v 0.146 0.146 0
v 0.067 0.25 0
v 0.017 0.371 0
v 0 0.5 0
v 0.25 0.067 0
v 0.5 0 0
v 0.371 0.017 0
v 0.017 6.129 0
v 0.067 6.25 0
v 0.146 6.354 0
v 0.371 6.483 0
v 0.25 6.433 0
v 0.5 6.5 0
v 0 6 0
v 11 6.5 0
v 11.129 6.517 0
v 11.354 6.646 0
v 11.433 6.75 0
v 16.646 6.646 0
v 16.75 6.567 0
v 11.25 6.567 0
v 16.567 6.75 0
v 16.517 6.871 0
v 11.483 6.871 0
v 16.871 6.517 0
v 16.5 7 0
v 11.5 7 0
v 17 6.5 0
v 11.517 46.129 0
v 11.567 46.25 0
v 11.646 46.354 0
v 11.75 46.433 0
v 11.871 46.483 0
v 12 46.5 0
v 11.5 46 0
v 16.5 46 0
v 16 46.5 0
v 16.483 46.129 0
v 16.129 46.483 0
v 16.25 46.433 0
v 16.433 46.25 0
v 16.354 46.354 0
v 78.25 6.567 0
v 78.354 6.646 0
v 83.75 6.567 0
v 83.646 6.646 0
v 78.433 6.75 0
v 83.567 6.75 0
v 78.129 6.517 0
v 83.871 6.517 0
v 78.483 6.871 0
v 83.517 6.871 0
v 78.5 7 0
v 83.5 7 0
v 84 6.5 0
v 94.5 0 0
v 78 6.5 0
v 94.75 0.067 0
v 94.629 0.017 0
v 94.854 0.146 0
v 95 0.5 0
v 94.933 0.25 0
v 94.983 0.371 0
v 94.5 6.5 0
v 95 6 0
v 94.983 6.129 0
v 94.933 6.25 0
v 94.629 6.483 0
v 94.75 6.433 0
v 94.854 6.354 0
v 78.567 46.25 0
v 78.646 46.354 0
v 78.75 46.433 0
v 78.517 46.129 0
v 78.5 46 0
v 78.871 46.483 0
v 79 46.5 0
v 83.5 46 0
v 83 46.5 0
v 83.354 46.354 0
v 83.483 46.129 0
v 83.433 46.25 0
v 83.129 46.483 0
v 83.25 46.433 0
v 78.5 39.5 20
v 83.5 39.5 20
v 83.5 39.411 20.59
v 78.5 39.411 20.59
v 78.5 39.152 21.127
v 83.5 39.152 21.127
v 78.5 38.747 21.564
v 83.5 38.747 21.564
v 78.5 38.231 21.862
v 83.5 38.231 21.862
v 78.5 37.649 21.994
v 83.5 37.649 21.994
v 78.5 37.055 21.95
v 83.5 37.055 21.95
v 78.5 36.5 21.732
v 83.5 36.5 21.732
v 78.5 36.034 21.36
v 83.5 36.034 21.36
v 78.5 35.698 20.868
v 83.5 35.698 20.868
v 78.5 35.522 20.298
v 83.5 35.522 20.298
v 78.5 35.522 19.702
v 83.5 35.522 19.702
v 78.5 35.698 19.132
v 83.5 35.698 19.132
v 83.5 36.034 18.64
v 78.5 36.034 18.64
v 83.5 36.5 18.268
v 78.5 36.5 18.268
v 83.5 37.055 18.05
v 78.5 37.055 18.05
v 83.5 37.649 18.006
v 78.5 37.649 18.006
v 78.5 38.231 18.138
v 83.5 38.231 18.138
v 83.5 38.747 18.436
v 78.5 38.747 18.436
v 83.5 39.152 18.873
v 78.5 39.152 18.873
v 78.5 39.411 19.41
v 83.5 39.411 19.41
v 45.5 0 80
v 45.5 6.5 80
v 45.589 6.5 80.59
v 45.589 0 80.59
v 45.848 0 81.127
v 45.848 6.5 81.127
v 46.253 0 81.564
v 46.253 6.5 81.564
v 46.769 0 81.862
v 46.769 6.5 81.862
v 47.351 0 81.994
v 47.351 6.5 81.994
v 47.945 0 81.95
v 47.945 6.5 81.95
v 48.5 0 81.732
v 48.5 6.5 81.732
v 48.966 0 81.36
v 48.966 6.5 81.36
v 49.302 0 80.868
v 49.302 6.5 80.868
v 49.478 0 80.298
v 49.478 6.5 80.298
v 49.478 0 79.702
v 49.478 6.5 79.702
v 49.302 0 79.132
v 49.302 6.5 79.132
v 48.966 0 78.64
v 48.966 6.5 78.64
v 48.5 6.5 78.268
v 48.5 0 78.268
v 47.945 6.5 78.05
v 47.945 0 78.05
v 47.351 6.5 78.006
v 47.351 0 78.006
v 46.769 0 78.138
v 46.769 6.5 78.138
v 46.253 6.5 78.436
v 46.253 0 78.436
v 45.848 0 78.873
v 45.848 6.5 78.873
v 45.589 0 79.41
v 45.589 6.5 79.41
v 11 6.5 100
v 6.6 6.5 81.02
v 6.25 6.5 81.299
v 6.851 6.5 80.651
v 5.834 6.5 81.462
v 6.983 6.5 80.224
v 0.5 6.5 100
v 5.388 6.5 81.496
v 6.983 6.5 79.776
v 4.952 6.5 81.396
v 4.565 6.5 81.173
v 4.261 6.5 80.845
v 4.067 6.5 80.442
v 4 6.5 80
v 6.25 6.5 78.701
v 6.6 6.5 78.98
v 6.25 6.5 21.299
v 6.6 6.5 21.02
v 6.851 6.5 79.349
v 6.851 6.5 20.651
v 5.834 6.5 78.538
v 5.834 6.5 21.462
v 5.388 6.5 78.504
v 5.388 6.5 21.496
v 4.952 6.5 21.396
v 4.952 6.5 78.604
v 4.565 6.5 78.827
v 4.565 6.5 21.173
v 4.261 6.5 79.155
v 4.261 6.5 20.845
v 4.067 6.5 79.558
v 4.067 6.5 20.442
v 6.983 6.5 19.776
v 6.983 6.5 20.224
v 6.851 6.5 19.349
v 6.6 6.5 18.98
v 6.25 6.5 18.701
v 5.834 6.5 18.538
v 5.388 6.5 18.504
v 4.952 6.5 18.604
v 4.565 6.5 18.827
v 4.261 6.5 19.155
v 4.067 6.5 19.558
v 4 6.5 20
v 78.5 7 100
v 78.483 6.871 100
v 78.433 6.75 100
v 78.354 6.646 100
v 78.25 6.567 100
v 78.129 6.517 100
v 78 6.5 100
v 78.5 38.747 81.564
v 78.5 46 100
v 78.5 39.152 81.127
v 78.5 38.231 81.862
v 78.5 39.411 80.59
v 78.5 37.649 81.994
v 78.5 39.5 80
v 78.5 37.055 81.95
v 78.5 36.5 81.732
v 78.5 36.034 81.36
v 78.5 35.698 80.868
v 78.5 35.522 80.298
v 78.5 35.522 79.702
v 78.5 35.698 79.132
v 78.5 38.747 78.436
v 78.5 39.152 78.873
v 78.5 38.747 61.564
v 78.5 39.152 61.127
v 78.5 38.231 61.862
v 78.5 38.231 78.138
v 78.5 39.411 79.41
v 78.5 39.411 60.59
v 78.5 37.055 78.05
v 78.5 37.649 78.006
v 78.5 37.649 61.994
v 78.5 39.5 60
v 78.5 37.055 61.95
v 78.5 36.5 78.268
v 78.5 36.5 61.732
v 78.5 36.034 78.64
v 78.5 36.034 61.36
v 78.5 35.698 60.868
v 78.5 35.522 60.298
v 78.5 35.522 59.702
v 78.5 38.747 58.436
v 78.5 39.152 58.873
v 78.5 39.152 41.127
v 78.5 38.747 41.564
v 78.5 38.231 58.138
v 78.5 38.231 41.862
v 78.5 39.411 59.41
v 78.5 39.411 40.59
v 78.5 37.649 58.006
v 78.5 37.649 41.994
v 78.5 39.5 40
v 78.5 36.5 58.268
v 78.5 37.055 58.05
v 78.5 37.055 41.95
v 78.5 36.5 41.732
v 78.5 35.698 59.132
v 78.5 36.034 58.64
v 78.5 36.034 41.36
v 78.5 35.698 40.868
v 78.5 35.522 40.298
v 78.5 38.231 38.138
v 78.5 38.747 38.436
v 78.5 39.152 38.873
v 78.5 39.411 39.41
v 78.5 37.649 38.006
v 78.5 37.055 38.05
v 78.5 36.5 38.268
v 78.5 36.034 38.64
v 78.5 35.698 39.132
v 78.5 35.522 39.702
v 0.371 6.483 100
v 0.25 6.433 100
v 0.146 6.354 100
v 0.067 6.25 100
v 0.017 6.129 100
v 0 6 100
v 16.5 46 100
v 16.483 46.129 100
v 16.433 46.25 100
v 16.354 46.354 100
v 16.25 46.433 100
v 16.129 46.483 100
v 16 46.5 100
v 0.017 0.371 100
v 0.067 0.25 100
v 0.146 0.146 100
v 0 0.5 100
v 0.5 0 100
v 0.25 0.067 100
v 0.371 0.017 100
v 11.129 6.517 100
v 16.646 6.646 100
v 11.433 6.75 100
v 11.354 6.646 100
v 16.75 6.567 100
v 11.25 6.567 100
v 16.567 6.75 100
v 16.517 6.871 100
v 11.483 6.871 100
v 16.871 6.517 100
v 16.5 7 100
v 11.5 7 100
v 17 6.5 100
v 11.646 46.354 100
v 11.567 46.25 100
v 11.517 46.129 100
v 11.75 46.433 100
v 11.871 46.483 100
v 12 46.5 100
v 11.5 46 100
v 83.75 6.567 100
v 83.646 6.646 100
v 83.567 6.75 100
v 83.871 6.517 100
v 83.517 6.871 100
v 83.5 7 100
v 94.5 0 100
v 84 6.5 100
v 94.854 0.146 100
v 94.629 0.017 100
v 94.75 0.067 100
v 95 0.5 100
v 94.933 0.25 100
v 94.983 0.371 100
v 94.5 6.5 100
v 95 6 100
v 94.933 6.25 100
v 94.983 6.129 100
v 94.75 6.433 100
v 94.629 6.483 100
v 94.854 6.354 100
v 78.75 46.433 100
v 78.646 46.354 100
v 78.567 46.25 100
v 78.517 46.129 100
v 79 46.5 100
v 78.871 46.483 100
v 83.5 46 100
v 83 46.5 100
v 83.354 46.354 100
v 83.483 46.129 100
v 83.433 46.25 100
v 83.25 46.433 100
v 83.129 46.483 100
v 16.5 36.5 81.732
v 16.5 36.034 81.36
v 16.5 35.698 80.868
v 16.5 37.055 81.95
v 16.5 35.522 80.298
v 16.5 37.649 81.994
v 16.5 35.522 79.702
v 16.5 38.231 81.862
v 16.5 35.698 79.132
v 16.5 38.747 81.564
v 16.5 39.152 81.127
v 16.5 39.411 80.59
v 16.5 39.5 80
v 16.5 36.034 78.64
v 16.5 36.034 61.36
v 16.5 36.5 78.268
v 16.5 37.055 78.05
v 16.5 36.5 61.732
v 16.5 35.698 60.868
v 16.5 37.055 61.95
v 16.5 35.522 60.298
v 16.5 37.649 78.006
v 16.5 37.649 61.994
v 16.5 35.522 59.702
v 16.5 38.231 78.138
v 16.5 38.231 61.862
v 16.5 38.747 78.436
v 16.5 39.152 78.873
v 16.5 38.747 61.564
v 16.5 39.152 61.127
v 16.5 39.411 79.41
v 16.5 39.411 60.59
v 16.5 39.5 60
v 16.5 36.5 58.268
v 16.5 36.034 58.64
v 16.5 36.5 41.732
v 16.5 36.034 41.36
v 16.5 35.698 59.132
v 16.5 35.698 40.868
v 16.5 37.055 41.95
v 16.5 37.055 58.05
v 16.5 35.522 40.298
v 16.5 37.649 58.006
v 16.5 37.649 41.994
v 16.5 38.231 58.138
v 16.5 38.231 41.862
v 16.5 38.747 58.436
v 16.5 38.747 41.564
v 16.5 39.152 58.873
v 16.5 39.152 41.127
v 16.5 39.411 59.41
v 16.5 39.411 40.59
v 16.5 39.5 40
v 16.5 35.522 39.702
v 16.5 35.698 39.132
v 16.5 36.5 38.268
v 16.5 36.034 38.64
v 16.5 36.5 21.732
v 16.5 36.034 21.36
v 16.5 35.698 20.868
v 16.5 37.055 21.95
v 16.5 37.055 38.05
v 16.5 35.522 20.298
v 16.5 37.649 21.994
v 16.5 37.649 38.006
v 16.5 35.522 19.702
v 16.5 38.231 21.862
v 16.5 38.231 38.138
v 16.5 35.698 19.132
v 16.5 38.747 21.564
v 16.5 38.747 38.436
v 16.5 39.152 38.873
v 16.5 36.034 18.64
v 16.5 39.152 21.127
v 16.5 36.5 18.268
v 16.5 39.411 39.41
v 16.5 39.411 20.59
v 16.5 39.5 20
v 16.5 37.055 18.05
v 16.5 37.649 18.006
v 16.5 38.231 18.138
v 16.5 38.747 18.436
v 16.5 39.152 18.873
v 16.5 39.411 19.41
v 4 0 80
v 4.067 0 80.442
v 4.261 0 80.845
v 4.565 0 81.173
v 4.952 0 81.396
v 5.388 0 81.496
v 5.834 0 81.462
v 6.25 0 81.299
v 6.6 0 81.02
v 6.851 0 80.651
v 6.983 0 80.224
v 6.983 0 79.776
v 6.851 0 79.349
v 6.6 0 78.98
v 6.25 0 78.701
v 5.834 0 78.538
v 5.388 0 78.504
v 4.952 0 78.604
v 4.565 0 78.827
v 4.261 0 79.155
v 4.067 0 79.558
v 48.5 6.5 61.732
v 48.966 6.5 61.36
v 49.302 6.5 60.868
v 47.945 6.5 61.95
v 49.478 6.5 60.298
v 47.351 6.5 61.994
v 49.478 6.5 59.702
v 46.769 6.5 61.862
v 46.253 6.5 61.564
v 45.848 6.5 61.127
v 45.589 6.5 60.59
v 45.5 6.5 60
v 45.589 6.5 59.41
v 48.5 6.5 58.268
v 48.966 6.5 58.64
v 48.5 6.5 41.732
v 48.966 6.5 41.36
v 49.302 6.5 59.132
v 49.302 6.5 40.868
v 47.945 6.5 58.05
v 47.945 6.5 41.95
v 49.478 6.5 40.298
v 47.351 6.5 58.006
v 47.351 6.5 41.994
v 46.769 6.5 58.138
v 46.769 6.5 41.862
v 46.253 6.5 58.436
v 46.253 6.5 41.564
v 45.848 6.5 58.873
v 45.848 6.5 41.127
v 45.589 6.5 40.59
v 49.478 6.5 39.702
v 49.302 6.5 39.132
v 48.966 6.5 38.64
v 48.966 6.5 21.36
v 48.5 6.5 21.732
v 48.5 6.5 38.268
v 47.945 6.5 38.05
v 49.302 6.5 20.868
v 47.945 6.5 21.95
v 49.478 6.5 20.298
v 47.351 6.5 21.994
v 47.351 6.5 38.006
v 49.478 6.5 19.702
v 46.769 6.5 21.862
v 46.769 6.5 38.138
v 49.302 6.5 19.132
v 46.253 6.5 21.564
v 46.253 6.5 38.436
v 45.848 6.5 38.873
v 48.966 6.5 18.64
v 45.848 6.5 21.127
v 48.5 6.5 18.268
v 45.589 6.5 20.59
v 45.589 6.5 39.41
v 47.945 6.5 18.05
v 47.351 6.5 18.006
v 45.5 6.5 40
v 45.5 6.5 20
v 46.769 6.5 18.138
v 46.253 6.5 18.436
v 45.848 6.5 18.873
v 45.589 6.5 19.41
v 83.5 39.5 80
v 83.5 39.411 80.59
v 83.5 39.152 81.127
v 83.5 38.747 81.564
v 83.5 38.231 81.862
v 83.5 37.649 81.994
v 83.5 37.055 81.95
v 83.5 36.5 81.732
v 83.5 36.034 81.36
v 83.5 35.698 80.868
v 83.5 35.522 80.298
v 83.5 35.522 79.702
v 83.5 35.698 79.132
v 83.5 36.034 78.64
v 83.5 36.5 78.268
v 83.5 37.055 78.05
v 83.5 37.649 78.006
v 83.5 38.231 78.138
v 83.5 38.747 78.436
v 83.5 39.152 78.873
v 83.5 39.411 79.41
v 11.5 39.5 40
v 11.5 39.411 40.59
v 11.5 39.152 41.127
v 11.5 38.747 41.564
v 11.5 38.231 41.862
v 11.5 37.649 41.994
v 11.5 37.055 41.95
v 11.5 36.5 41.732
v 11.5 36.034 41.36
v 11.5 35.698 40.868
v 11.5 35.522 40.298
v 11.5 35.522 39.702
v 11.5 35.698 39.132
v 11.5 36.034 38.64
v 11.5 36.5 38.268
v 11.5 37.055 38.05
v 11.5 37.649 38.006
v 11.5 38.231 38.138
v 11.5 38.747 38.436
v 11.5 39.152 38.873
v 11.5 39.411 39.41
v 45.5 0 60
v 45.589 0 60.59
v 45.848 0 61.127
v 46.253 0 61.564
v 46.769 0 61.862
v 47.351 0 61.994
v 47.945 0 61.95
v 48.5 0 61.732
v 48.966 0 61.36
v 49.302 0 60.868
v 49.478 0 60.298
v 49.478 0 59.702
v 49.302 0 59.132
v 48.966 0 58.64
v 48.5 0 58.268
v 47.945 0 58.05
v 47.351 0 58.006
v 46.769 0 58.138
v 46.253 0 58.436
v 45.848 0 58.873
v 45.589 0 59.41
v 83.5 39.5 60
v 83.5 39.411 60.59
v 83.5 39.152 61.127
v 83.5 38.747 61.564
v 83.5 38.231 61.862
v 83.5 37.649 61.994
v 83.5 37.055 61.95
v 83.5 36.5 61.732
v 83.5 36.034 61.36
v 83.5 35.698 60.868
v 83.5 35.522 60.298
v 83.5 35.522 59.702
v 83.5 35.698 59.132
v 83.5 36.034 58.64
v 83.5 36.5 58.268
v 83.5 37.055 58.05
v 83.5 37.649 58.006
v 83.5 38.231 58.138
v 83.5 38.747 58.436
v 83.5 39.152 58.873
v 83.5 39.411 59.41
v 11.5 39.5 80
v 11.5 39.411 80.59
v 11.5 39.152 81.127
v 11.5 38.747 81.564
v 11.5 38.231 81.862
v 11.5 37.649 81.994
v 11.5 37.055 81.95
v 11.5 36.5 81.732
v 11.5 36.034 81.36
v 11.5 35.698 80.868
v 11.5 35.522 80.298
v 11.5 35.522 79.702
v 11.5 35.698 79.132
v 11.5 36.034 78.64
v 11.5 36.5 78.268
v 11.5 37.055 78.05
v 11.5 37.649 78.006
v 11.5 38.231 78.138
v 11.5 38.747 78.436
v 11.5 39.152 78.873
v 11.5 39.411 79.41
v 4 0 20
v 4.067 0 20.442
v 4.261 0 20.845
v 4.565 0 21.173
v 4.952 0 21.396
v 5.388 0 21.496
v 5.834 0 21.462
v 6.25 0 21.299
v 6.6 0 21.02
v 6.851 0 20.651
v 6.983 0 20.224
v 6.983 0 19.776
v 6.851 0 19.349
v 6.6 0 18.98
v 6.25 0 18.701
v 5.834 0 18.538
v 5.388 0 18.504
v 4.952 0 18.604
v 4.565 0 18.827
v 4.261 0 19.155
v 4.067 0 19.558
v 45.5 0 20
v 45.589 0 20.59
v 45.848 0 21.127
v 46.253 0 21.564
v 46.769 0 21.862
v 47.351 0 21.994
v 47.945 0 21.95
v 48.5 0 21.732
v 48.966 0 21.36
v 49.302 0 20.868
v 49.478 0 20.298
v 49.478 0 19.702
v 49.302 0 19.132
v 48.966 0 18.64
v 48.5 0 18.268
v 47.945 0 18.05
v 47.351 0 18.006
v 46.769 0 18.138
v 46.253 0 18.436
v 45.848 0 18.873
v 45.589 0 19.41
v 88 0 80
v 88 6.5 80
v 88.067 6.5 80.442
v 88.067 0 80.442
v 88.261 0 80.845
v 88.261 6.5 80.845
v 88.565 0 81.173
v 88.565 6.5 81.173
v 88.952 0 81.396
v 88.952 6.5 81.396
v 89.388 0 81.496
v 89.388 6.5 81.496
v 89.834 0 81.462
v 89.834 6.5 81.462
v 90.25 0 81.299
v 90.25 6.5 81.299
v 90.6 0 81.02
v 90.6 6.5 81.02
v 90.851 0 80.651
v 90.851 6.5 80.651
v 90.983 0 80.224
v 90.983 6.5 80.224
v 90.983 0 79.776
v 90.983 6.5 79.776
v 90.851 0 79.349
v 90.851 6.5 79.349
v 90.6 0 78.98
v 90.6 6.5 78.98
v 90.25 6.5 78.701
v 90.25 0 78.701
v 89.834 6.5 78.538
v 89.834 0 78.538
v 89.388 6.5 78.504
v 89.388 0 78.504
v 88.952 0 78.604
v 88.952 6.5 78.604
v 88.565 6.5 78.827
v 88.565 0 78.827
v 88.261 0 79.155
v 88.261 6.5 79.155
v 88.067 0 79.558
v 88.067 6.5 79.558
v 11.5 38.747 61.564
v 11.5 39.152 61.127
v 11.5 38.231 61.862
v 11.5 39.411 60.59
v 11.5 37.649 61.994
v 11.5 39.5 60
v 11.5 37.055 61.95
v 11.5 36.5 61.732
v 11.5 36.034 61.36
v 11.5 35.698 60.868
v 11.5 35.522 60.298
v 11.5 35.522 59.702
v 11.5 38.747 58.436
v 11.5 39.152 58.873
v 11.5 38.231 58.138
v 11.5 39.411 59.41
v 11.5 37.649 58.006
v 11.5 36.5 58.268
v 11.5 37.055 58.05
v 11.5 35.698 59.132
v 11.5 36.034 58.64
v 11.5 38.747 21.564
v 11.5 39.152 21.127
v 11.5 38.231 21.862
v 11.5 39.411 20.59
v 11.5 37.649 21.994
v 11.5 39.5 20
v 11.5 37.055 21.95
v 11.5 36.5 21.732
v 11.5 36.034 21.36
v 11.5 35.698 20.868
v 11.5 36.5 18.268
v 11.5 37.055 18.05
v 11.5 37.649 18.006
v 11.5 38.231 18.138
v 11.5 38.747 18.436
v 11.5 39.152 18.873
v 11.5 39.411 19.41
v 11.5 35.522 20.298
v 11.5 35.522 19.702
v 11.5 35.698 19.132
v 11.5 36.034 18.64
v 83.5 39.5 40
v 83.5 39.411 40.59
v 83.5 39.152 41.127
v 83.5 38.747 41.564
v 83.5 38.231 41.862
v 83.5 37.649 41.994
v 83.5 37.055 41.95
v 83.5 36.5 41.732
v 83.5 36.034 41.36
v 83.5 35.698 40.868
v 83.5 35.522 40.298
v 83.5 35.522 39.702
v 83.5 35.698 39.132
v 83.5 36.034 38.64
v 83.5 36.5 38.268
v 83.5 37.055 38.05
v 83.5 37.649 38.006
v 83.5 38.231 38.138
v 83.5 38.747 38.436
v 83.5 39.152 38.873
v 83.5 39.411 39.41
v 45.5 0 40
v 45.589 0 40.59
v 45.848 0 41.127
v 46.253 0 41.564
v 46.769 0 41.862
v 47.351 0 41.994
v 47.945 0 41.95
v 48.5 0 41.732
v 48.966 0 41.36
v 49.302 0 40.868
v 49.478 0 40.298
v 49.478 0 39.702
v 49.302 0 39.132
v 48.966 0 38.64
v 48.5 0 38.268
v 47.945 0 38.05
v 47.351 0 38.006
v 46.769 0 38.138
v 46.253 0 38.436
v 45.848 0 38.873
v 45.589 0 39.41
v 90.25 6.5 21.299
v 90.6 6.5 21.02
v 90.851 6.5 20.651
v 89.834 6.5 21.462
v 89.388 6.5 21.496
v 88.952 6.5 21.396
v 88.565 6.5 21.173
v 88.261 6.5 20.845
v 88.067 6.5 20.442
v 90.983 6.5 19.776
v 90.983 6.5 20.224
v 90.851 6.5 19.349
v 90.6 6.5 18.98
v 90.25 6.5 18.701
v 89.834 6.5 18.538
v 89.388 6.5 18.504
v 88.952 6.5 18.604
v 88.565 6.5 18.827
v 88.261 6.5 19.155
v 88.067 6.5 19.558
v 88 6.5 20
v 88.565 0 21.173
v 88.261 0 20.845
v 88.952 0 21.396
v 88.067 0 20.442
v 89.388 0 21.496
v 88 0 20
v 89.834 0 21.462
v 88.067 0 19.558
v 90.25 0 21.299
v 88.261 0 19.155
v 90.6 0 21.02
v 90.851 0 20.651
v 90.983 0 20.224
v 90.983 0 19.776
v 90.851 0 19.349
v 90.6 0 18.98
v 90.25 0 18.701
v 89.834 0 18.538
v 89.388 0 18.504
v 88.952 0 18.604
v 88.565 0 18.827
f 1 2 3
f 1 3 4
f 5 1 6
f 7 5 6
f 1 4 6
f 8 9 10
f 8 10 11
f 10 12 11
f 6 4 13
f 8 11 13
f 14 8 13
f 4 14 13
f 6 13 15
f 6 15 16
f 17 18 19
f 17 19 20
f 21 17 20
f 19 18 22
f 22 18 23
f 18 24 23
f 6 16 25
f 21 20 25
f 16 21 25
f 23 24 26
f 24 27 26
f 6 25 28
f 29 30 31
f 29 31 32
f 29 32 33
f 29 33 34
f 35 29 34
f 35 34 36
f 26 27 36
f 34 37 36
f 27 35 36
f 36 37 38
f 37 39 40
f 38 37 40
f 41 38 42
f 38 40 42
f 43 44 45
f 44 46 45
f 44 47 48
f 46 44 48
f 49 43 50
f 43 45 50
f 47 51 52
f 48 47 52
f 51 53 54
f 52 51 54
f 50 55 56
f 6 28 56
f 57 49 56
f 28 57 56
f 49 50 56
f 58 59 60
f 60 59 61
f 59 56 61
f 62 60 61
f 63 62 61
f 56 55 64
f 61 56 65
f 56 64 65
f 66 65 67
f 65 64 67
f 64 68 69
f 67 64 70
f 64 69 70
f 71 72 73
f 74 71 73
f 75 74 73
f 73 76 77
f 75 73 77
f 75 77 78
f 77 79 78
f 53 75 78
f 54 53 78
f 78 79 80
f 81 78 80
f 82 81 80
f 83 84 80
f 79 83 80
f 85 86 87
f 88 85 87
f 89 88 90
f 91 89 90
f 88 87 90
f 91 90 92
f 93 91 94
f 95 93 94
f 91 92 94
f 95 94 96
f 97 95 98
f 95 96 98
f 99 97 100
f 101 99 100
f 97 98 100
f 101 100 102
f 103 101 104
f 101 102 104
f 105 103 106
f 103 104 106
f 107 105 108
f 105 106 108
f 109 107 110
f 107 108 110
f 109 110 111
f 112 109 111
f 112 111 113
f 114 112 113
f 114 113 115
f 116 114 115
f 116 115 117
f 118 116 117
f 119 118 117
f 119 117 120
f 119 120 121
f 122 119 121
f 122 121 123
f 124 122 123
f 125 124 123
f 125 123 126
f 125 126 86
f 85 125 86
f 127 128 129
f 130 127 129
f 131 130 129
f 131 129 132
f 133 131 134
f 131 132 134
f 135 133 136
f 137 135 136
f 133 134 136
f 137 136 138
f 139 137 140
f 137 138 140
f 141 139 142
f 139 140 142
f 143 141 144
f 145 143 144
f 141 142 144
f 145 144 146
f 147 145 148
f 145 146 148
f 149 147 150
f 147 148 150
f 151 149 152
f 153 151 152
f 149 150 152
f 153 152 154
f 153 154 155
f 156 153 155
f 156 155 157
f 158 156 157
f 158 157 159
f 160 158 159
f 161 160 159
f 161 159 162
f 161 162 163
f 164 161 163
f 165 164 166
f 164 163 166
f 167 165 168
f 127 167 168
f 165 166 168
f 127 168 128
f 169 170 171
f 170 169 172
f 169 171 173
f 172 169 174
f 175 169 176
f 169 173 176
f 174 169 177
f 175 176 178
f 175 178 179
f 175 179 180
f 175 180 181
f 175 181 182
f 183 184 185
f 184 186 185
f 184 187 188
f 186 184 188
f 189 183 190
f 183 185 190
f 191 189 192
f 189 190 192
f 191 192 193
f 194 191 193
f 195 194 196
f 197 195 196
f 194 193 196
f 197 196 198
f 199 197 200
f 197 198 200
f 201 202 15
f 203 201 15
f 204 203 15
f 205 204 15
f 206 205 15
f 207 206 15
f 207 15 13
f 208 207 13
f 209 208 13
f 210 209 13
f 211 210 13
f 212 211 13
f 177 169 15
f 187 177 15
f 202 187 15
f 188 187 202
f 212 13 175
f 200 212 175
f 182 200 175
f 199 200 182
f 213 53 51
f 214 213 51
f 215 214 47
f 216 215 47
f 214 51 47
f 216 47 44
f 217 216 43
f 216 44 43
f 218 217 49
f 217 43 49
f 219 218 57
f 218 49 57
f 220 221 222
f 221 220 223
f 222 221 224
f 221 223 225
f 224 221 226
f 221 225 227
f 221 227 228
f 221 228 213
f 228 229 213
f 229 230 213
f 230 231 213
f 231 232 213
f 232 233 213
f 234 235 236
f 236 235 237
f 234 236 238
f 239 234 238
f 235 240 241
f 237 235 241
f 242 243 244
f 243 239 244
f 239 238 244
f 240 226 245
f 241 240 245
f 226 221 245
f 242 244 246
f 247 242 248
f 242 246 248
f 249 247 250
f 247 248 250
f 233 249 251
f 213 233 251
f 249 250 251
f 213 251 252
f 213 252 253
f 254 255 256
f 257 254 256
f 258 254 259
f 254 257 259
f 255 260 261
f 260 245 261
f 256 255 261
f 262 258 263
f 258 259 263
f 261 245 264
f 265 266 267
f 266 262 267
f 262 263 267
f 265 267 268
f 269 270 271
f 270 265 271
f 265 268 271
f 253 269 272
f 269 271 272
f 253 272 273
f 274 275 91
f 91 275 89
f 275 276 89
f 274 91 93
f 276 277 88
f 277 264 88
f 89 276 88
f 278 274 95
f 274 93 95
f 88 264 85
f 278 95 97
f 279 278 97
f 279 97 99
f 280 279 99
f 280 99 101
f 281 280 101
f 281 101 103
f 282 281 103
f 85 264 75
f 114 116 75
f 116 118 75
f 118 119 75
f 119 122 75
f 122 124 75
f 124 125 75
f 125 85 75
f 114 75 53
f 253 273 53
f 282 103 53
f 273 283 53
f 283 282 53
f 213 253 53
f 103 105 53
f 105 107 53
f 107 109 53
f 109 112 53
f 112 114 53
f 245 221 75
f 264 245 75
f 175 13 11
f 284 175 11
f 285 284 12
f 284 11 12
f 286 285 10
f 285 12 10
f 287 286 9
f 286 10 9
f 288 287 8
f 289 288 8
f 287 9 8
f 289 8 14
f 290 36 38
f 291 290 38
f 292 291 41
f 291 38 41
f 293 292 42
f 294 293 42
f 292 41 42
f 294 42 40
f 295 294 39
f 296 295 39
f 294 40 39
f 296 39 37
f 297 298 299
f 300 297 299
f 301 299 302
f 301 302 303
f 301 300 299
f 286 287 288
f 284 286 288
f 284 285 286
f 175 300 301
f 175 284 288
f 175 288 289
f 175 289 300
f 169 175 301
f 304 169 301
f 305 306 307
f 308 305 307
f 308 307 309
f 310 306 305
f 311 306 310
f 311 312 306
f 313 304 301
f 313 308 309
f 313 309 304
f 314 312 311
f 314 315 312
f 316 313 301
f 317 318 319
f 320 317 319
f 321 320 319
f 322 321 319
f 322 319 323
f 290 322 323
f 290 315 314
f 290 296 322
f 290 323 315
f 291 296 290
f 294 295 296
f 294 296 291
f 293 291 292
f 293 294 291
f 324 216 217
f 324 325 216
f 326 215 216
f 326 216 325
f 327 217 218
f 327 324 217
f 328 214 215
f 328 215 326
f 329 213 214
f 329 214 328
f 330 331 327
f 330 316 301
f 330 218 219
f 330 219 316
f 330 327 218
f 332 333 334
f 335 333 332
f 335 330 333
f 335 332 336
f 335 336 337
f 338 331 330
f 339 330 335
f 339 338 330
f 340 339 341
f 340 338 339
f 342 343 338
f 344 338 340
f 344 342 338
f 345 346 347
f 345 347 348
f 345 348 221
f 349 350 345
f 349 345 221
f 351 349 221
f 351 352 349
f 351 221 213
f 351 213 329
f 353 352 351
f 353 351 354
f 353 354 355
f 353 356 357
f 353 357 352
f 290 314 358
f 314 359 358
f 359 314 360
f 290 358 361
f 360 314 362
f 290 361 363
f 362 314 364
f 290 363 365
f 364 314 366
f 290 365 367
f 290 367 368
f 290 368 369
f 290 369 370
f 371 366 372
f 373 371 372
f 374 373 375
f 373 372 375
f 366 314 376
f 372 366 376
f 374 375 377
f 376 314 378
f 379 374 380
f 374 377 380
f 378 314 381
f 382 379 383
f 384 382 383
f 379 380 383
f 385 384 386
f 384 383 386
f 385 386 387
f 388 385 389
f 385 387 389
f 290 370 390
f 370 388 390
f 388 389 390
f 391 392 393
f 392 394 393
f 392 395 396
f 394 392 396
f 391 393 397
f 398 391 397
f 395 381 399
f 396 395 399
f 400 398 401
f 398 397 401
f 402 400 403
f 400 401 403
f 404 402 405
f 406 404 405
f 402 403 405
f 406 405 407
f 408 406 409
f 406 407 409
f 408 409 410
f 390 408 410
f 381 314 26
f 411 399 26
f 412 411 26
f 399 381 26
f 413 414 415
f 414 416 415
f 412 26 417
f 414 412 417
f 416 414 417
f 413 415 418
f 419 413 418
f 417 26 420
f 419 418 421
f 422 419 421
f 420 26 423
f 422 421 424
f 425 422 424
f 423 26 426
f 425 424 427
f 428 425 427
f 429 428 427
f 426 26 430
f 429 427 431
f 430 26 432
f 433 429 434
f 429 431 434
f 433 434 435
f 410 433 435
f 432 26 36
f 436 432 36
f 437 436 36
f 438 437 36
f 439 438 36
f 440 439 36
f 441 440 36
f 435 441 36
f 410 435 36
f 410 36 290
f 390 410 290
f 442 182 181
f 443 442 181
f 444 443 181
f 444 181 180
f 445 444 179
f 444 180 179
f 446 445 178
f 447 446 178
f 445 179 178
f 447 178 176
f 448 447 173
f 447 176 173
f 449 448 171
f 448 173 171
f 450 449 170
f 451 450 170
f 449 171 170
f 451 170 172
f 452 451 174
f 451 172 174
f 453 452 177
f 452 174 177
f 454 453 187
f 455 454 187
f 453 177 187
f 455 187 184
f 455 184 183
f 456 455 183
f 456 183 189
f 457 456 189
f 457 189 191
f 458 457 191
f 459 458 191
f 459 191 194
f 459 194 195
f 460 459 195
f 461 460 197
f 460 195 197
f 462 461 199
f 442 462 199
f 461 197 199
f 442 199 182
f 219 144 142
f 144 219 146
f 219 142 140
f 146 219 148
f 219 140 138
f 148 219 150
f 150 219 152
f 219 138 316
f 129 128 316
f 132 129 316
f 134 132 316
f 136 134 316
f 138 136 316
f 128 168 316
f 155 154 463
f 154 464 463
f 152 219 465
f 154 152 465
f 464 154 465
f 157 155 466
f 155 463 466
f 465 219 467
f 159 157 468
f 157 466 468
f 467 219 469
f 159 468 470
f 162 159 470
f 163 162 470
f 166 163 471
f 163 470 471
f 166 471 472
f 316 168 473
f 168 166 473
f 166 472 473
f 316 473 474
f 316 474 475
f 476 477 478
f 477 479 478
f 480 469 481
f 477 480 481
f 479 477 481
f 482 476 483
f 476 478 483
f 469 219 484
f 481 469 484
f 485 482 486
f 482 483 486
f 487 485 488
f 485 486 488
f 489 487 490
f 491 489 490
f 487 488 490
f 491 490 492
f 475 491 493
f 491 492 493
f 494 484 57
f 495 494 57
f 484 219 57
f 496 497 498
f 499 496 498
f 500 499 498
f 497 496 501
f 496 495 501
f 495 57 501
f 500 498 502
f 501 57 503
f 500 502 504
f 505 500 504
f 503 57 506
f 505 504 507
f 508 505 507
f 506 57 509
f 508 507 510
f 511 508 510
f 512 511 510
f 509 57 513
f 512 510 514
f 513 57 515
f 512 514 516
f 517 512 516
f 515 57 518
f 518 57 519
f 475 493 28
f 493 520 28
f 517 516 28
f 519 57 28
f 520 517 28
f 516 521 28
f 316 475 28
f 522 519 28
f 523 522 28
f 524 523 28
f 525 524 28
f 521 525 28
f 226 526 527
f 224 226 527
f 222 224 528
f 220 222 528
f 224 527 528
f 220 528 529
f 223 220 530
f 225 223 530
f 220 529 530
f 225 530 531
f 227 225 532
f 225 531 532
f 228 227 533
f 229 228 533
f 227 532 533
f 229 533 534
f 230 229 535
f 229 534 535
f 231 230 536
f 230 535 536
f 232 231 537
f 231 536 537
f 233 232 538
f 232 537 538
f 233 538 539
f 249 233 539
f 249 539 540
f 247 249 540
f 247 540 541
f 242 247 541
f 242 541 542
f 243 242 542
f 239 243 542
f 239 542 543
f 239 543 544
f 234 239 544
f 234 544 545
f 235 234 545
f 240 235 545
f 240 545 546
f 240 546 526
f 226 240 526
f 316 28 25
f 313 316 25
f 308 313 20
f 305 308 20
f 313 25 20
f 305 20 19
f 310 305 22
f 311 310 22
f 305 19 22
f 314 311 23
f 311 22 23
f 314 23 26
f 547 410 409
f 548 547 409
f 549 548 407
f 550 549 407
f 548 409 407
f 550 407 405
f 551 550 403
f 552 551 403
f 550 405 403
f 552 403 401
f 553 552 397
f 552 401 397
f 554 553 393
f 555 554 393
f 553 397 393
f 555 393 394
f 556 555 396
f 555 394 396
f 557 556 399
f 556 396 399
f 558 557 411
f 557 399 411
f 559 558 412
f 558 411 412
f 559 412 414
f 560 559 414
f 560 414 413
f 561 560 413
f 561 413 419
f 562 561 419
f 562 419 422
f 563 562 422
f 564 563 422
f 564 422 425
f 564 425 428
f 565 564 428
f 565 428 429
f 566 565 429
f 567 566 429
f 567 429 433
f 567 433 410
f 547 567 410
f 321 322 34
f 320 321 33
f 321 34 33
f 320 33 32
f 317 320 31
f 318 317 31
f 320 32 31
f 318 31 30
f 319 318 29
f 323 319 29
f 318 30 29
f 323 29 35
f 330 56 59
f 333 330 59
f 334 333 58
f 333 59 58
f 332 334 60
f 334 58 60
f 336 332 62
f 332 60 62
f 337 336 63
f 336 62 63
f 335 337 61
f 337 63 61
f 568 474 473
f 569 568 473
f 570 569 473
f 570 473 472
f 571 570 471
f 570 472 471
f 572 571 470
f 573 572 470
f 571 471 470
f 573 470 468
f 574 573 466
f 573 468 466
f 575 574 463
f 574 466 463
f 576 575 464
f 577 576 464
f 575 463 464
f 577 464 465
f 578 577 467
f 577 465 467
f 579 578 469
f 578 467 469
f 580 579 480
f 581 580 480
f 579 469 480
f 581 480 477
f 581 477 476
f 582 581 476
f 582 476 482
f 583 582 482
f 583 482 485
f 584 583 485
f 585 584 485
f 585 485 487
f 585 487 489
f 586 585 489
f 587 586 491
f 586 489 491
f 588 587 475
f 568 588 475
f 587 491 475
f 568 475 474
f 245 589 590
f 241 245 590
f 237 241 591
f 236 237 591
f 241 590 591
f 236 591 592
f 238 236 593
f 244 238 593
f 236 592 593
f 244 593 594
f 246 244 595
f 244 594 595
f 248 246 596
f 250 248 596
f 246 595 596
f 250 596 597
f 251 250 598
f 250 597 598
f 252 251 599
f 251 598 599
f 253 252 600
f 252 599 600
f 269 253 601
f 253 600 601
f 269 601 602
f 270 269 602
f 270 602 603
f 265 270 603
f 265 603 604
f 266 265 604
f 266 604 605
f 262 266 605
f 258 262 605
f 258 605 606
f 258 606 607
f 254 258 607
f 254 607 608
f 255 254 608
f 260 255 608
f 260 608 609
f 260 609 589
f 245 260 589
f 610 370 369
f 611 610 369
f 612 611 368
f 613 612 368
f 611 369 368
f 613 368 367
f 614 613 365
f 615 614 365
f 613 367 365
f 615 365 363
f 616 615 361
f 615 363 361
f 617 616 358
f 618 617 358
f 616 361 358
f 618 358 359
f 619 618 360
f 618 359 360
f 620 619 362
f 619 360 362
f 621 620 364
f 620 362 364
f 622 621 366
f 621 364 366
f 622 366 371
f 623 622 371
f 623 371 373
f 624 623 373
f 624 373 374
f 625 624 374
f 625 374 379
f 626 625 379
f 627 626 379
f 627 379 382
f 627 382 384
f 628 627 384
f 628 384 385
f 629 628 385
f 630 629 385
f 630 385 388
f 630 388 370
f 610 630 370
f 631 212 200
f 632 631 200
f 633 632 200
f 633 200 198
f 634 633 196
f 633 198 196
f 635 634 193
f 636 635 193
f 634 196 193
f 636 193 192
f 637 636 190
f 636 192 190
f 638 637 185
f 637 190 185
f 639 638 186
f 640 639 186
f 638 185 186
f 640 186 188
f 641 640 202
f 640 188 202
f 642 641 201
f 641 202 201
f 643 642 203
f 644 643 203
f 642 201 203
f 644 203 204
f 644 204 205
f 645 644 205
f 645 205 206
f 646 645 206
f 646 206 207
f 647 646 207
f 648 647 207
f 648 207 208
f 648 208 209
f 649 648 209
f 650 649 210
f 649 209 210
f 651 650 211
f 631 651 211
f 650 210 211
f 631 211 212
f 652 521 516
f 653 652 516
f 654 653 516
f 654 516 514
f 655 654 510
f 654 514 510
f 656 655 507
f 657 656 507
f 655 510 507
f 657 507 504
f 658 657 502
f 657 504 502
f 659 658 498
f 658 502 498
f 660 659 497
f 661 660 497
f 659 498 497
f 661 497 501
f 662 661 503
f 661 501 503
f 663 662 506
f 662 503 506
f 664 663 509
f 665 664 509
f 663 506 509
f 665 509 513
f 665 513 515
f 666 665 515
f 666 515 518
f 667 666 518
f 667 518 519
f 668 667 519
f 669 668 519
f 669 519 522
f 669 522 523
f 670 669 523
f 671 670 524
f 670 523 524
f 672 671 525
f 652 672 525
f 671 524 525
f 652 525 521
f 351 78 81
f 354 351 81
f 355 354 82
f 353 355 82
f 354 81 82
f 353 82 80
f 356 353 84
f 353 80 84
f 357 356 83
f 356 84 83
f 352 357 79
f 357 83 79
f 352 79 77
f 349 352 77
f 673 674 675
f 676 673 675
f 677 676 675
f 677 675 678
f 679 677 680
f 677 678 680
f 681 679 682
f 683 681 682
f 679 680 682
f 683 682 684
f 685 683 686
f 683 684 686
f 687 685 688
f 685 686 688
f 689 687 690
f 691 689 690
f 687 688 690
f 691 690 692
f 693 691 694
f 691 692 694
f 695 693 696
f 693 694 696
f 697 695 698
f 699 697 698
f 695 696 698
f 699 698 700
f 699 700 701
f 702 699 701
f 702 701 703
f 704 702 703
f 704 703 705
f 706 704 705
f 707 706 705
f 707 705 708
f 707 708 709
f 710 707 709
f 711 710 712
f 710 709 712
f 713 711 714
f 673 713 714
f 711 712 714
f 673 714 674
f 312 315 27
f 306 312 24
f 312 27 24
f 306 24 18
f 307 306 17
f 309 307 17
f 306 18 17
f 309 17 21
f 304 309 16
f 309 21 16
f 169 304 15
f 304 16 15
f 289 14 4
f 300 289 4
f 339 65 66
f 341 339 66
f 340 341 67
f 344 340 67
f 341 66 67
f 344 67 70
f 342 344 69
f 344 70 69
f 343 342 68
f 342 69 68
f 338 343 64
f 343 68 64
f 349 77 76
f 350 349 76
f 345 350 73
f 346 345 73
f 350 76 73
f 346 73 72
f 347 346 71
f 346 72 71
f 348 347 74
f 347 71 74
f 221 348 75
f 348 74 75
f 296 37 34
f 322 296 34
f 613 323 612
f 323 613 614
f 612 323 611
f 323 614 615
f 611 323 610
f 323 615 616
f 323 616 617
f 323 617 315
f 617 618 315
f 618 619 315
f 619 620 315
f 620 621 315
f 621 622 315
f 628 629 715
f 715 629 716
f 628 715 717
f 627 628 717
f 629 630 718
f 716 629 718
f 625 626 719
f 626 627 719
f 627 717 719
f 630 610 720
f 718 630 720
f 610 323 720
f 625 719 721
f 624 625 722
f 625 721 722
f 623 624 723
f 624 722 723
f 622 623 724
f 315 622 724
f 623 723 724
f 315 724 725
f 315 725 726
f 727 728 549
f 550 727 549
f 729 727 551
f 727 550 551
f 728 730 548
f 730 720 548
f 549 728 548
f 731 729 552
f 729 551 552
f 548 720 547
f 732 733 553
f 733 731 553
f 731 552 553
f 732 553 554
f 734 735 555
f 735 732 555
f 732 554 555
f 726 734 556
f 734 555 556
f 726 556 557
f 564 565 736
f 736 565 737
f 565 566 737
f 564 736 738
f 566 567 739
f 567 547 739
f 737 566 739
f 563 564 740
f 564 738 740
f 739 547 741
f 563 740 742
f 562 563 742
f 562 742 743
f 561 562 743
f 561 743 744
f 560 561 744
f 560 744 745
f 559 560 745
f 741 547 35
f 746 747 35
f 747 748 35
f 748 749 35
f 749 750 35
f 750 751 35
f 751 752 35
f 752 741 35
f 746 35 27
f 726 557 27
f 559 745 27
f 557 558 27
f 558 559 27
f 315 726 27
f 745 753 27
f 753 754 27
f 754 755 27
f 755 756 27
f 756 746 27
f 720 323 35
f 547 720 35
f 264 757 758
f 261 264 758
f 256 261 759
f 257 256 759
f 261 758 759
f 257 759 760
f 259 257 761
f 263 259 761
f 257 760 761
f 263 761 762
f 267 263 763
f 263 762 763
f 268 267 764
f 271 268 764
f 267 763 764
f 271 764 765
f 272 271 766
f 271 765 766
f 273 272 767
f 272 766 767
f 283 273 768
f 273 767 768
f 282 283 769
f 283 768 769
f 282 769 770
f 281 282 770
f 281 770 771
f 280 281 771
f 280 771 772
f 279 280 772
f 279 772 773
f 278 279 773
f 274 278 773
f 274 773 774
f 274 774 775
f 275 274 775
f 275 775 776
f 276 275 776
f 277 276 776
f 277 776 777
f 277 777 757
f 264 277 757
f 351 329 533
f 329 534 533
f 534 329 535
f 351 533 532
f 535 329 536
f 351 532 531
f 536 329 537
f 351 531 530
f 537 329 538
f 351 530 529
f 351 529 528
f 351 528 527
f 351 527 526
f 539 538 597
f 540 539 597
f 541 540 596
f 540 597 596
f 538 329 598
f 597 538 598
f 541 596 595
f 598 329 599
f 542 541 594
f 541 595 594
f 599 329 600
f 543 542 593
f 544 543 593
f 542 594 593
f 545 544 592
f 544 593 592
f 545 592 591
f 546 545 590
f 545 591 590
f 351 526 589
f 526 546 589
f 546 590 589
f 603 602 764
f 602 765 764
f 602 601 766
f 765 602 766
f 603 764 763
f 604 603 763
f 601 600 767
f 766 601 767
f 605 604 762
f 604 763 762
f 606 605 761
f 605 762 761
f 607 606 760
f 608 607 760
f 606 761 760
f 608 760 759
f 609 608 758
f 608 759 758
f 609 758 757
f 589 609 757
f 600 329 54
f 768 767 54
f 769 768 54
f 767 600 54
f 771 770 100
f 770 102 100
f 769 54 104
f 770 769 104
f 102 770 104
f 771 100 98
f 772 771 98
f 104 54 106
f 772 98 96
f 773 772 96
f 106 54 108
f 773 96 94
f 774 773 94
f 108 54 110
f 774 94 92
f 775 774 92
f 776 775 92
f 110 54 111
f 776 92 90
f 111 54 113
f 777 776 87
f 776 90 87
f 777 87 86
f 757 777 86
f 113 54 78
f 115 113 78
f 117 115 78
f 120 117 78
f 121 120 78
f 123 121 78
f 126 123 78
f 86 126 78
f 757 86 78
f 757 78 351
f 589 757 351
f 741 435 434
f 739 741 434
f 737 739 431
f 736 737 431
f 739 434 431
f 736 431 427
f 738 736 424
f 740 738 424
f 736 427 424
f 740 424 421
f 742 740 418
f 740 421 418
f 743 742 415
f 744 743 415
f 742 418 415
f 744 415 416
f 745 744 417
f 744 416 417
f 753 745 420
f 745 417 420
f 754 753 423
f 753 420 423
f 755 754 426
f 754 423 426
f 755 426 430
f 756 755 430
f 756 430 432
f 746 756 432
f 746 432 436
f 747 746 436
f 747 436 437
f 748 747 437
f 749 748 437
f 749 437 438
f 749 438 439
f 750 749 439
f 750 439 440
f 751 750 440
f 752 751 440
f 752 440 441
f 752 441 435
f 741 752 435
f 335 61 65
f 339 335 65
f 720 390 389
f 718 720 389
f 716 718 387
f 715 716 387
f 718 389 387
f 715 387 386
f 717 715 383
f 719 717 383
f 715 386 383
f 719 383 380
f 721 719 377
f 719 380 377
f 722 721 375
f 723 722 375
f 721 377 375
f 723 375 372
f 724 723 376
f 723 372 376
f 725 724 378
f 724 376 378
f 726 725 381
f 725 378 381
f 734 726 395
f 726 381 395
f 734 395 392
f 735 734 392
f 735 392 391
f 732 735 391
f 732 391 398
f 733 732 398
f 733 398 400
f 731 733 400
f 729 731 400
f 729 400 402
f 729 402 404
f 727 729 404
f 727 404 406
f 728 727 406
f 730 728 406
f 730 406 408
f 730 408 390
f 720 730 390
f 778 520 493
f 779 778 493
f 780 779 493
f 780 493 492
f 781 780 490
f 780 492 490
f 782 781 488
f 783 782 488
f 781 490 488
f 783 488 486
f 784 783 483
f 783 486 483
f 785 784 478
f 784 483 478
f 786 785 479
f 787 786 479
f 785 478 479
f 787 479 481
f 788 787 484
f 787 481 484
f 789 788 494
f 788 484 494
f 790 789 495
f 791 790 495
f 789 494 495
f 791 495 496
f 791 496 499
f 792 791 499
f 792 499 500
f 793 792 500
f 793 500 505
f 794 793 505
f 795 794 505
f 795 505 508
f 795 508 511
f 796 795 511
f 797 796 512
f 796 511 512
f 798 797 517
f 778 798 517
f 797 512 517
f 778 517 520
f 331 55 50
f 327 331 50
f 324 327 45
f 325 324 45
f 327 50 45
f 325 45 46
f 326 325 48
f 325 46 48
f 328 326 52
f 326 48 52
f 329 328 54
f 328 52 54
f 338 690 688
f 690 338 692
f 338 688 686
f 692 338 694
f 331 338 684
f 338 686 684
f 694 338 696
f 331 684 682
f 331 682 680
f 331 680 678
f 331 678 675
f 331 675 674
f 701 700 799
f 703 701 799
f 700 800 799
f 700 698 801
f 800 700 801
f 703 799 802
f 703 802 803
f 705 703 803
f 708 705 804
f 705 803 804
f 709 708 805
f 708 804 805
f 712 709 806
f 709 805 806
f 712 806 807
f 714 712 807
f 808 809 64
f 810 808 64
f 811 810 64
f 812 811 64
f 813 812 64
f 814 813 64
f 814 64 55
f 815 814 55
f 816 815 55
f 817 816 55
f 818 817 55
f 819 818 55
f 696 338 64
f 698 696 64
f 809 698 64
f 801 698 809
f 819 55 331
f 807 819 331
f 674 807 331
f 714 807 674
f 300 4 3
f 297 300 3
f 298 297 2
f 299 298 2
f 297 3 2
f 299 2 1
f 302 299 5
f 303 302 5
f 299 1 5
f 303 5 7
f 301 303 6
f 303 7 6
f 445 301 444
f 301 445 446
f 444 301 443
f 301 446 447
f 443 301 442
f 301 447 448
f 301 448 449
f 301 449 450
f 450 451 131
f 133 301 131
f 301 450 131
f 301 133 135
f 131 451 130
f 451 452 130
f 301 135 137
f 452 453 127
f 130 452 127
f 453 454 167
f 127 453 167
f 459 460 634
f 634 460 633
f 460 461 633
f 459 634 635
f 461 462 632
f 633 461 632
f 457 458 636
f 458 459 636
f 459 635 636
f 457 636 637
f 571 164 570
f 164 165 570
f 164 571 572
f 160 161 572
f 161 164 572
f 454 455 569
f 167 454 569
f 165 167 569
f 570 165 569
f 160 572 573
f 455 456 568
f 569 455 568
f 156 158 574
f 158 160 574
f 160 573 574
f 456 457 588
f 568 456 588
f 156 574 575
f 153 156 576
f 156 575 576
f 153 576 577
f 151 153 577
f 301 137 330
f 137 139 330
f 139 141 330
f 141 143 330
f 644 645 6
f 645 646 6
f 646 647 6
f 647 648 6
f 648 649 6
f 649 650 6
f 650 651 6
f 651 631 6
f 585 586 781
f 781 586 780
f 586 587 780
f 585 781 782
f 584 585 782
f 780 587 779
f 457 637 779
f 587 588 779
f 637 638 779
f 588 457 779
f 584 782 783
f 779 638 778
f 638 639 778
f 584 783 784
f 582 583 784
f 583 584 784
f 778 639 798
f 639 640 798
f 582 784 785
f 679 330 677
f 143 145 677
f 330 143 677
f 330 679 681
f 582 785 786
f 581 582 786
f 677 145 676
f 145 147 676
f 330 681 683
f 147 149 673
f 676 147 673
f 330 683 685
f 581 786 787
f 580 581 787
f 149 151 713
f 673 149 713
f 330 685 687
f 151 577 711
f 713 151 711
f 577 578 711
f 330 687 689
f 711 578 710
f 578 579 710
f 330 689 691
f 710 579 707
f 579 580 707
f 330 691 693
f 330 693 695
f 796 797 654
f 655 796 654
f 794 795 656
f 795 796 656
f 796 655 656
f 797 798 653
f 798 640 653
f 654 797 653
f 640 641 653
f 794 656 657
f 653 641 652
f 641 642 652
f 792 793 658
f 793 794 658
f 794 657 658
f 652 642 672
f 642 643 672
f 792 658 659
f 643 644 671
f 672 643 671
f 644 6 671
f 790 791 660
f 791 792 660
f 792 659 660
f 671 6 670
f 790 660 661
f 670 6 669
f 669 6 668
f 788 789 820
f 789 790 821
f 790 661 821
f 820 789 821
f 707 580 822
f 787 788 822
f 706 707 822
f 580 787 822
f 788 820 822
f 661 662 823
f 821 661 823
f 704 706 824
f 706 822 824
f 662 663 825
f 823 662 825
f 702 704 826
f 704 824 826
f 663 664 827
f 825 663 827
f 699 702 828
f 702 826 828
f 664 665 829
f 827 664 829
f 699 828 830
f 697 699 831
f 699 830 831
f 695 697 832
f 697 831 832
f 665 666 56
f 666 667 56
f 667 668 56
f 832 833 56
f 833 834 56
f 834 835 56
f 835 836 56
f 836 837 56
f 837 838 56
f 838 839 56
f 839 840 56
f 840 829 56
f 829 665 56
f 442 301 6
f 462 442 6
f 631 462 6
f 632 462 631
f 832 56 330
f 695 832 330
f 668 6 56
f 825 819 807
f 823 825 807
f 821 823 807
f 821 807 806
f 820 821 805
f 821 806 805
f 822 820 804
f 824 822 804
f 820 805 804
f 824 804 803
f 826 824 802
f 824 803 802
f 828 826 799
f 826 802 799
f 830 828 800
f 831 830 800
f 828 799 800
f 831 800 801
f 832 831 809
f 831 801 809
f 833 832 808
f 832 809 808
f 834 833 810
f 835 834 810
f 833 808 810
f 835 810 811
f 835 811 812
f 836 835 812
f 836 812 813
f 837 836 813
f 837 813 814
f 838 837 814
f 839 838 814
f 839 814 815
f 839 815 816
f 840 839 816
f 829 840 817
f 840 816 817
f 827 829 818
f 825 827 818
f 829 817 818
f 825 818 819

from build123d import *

# Parameters (mm, degrees)
F1_DEPTH = 100
F2_R     = 2
F3_DEPTH = 72
F4_R     = 2
F4_R_2   = 1.5
F5_DEPTH = 6.5


with BuildPart() as f1:
    # F0 (on Top) → F1 (new body)
    with BuildSketch(Plane.XY):
        with BuildLine():
            ThreePointArc((0, 0.5), (0.146447, 0.146447), (0.5, 0))
            Line((0.5, 0), (94.5, 0))
            ThreePointArc((94.5, 0), (94.853553, 0.146447), (95, 0.5))
            Line((95, 0.5), (95, 6))
            ThreePointArc((95, 6), (94.853553, 6.353553), (94.5, 6.5))
            Line((94.5, 6.5), (84, 6.5))
            ThreePointArc((84, 6.5), (83.646447, 6.646447), (83.5, 7))
            Line((83.5, 7), (83.5, 46))
            ThreePointArc((83.5, 46), (83.353553, 46.353553), (83, 46.5))
            Line((83, 46.5), (79, 46.5))
            ThreePointArc((79, 46.5), (78.646447, 46.353553), (78.5, 46))
            Line((78.5, 46), (78.5, 7))
            ThreePointArc((78.5, 7), (78.353553, 6.646447), (78, 6.5))
            Line((78, 6.5), (17, 6.5))
            ThreePointArc((17, 6.5), (16.646447, 6.646447), (16.5, 7))
            Line((16.5, 7), (16.5, 46))
            ThreePointArc((16.5, 46), (16.353553, 46.353553), (16, 46.5))
            Line((16, 46.5), (12, 46.5))
            ThreePointArc((12, 46.5), (11.646447, 46.353553), (11.5, 46))
            Line((11.5, 46), (11.5, 7))
            ThreePointArc((11.5, 7), (11.353553, 6.646447), (11, 6.5))
            Line((11, 6.5), (0.5, 6.5))
            ThreePointArc((0.5, 6.5), (0.146447, 6.353553), (0, 6))
            Line((0, 6), (0, 0.5))
        make_face()
    extrude(amount=F1_DEPTH)

    # F2 (on face) → F3 (cut, through all)
    with BuildSketch(Plane.YZ.offset(83.5)):
        with Locations((37.5, 80)):
            Circle(F2_R)
        with Locations((37.5, 60)):
            Circle(F2_R)
        with Locations((37.5, 40)):
            Circle(F2_R)
        with Locations((37.5, 20)):
            Circle(F2_R)
    extrude(amount=-F3_DEPTH, mode=Mode.SUBTRACT)

    # F4 (on face) → F5 (cut, through all)
    with BuildSketch(Plane(origin=(0, 6.5, 0), x_dir=(-1, 0, 0), z_dir=(0, 1, 0))):
        with Locations((-47.5, 80)):
            Circle(F4_R)
        with Locations((-47.5, 60)):
            Circle(F4_R)
        with Locations((-47.5, 40)):
            Circle(F4_R)
        with Locations((-47.5, 20)):
            Circle(F4_R)
        with Locations((-5.5, 80)):
            Circle(F4_R_2)
        with Locations((-5.5, 20)):
            Circle(F4_R_2)
        with Locations((-89.5, 80)):
            Circle(F4_R_2)
        with Locations((-89.5, 20)):
            Circle(F4_R_2)
    extrude(amount=-F5_DEPTH, mode=Mode.SUBTRACT)


solid = f1.part
